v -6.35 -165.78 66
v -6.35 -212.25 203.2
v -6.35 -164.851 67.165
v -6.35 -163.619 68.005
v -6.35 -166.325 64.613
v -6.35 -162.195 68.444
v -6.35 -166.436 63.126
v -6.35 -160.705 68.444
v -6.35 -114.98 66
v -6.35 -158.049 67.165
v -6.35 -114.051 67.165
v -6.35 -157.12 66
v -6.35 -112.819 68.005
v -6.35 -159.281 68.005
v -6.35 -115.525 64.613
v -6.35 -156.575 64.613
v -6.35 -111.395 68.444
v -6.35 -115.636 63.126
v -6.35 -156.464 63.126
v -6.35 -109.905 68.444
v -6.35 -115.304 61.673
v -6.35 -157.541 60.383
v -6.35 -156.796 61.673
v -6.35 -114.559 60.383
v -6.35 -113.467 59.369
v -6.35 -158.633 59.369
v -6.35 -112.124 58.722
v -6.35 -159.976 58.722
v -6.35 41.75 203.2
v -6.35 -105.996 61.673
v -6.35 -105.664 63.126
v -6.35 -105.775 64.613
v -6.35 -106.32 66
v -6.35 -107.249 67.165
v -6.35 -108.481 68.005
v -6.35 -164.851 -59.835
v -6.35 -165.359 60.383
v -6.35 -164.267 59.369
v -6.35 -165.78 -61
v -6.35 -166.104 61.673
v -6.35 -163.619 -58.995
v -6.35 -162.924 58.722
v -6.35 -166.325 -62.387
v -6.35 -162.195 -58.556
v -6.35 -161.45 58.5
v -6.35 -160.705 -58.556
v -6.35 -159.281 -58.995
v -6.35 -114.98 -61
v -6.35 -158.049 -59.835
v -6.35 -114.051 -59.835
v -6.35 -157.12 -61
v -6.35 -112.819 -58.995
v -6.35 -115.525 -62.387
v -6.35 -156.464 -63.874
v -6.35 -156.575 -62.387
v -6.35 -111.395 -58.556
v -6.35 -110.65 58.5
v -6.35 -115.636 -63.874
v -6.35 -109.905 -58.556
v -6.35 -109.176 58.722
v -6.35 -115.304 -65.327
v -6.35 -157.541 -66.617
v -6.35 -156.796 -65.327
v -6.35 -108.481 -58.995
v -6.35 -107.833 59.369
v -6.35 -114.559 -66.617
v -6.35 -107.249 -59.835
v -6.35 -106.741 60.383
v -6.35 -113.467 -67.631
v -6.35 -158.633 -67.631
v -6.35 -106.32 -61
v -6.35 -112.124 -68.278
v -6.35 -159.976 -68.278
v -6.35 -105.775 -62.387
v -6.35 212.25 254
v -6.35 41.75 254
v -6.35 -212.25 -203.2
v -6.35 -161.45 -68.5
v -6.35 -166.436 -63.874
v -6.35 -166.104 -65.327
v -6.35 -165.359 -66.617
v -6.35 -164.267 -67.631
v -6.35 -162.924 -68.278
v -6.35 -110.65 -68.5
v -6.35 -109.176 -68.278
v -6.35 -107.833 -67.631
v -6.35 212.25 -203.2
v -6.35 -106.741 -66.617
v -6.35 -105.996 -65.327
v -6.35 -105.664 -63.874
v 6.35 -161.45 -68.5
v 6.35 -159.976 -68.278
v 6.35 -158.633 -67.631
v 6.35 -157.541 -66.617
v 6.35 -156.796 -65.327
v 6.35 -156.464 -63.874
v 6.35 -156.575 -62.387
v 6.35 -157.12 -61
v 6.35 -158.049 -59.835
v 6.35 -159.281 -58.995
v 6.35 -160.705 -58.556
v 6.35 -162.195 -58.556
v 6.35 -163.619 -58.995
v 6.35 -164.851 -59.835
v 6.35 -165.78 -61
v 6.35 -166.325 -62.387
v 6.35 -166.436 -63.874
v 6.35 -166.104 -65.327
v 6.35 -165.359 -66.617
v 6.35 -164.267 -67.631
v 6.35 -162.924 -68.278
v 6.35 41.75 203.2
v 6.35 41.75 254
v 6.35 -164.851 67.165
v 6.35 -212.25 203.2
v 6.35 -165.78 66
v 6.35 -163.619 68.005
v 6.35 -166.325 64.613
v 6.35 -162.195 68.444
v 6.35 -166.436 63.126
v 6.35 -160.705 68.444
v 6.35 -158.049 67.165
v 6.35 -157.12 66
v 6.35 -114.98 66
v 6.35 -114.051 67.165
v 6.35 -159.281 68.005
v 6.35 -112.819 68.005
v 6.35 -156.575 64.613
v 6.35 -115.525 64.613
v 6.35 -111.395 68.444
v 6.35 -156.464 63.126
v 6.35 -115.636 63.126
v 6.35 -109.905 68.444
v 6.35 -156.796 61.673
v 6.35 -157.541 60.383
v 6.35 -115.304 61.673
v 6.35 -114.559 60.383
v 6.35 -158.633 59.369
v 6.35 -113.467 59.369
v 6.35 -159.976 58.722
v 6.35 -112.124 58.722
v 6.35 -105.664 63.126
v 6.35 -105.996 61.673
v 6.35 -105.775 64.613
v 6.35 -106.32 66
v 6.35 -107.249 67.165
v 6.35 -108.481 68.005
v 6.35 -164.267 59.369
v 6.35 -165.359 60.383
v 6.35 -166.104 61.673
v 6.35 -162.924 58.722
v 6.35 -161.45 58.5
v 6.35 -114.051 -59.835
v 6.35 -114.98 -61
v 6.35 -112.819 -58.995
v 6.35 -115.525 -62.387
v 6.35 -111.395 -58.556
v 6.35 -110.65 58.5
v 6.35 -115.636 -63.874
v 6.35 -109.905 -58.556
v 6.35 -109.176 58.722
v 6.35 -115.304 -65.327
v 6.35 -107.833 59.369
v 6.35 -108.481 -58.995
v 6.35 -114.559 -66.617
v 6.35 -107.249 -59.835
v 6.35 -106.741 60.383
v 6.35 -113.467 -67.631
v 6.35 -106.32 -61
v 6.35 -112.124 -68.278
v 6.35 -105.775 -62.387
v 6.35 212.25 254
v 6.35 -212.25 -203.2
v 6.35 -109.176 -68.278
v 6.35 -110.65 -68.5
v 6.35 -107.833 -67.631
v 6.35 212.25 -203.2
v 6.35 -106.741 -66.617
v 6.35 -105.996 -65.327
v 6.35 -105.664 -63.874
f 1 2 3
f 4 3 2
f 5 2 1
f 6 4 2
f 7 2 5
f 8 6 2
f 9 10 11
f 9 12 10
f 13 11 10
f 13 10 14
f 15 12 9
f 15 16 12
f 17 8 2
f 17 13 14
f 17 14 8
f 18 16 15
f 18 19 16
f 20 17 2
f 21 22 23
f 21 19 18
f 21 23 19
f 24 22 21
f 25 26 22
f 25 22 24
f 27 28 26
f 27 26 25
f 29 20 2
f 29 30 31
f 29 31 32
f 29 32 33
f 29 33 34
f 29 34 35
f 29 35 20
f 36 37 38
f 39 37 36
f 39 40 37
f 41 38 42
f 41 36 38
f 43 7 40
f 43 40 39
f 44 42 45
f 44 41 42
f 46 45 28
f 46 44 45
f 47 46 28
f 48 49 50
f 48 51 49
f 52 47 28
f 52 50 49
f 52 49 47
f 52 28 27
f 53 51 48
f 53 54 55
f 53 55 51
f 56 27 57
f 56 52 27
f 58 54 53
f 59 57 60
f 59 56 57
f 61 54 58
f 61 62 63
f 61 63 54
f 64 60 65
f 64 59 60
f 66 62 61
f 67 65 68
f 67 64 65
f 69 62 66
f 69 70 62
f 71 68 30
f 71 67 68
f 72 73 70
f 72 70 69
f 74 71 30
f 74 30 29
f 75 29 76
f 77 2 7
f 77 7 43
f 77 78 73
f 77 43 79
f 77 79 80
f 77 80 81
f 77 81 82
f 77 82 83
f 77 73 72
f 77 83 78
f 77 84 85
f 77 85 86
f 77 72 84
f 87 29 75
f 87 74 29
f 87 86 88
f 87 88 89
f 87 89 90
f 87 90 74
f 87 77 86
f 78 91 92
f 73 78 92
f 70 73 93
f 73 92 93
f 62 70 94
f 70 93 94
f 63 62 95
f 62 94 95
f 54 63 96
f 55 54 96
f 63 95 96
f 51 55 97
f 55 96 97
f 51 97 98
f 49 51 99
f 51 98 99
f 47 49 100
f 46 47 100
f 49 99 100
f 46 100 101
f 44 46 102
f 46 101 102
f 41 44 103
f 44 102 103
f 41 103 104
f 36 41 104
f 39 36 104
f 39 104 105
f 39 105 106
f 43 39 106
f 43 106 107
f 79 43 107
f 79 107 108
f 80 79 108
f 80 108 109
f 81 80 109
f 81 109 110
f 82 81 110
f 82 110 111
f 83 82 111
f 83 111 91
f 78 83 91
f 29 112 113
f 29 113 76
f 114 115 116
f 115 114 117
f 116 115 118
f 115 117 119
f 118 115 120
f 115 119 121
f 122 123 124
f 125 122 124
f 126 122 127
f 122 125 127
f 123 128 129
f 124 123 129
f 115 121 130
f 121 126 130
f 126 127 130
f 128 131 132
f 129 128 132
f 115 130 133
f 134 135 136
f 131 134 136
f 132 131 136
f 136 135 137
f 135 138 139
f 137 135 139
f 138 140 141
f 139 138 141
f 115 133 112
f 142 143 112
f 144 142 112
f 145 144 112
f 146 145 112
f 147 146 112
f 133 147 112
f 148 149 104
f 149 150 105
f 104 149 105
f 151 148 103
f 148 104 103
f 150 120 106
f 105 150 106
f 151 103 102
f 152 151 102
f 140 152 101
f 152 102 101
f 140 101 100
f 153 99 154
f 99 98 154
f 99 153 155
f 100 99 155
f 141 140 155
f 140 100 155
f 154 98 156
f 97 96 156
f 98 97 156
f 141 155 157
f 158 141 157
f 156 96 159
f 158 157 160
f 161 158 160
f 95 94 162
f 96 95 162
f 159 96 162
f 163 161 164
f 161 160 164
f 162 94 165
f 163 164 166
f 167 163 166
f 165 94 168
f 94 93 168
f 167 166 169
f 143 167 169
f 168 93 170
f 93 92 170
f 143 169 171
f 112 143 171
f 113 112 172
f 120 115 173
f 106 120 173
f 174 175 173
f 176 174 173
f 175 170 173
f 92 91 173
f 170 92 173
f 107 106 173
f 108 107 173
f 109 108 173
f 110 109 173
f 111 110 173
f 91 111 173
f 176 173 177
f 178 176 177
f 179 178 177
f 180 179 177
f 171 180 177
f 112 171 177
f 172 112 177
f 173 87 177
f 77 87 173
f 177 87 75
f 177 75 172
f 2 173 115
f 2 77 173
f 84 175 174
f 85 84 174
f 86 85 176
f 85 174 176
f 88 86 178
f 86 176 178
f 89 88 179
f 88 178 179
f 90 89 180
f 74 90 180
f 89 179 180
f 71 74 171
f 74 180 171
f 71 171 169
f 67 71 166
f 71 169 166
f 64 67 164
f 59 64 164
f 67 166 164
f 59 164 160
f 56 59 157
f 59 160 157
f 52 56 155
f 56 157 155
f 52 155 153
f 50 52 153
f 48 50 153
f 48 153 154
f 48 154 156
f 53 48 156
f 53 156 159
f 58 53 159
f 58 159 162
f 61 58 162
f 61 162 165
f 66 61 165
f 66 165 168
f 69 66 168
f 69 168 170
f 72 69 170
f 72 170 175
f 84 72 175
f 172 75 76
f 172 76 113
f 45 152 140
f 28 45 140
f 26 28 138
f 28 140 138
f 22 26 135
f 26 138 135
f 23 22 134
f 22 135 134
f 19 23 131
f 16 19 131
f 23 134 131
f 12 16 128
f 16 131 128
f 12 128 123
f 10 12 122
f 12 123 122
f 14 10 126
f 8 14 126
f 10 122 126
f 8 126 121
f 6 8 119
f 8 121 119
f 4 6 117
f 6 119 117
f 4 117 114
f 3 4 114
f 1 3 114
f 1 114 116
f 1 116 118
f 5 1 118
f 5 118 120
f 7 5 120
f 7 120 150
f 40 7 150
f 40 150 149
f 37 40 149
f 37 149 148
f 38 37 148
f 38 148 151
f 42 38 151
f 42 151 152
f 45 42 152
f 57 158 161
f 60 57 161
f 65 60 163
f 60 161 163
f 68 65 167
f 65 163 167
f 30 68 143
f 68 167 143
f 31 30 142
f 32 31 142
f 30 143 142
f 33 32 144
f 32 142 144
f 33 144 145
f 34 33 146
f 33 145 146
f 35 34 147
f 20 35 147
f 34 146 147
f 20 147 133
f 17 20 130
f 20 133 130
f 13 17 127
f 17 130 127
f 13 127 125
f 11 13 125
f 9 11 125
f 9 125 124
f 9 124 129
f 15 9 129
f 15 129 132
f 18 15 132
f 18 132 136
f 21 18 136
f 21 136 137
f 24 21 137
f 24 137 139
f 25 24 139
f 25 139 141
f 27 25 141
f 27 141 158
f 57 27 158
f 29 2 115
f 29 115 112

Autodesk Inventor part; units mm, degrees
ref_plane "YZ Plane" through (0, 0, 0) normal (1, 0, 0) x (0, 1, 0)
ref_plane "XZ Plane" through (0, 0, 0) normal (0, 1, 0) x (-1, 0, 0)
ref_plane "XY Plane" through (0, 0, 0) normal (0, 0, 1) x (1, 0, 0)
sketch "Sketch1" plane through (0, 0, 0) normal (1, 0, 0) x (0, 1, 0)
  line L0 (-212.25, 203.2) -> (212.25, 203.2)
  line L1 (212.25, 203.2) -> (212.25, -203.2)
  line L2 (212.25, -203.2) -> (-212.25, -203.2)
  line L3 (-212.25, -203.2) -> (-212.25, 203.2)
  line L4 (-212.25, 203.2) -> (212.25, -203.2) construction
  line L5 (212.25, 203.2) -> (-212.25, -203.2) construction
  point P0 (0, 0)
  dimension "d0" = 406.4
  dimension "d1" = 424.5
extrude "Extrusion1" add sketch "Sketch1" along normal mid plane 12.7
sketch "Sketch2" plane through (6.35, 0, 0) normal (1, 0, 0) x (0, 0, -1)
  circle A0 centre (-63.5, -161.45) radius 5
  line L0 (203.2, -212.25) -> (203.2, 212.25) projected
  line L1 (203.2, 212.25) -> (-203.2, 212.25) projected
  line L2 (-203.2, 212.25) -> (-203.2, -212.25) projected
  line L3 (-203.2, -212.25) -> (203.2, -212.25) projected
  circle A1 centre (63.5, -161.45) radius 5
  circle A2 centre (-63.5, -110.65) radius 5
  circle A3 centre (63.5, -110.65) radius 5
  point P0 (0, 0)
  dimension "d6" = 127
  dimension "d9" = 50.8
  dimension "d12" = 10
  dimension "d14" = 63.5
  dimension "d15" = 50.8
extrude "Extrusion2" cut sketch "Sketch2" against normal blind 12.7 contours A0 | A1 | A2 | A3
sketch "Sketch3" plane through (-6.35, -212.25, 203.2) normal (0, 0, 1) x (1, 0, 0)
  line L0 (0, 424.5) -> (12.7, 424.5) projected
  line L1 (12.7, 0) -> (12.7, 424.5) projected
  line L2 (0, 424.5) -> (12.7, 424.5)
  line L3 (12.7, 424.5) -> (12.7, 254)
  line L4 (12.7, 254) -> (0, 254)
  line L5 (0, 254) -> (0, 424.5)
  point P0 (6.35, 212.25)
  dimension "d20" = 170.5
extrude "Extrusion3" add sketch "Sketch3" along normal blind 50.8
properties part number "Wood-7"
